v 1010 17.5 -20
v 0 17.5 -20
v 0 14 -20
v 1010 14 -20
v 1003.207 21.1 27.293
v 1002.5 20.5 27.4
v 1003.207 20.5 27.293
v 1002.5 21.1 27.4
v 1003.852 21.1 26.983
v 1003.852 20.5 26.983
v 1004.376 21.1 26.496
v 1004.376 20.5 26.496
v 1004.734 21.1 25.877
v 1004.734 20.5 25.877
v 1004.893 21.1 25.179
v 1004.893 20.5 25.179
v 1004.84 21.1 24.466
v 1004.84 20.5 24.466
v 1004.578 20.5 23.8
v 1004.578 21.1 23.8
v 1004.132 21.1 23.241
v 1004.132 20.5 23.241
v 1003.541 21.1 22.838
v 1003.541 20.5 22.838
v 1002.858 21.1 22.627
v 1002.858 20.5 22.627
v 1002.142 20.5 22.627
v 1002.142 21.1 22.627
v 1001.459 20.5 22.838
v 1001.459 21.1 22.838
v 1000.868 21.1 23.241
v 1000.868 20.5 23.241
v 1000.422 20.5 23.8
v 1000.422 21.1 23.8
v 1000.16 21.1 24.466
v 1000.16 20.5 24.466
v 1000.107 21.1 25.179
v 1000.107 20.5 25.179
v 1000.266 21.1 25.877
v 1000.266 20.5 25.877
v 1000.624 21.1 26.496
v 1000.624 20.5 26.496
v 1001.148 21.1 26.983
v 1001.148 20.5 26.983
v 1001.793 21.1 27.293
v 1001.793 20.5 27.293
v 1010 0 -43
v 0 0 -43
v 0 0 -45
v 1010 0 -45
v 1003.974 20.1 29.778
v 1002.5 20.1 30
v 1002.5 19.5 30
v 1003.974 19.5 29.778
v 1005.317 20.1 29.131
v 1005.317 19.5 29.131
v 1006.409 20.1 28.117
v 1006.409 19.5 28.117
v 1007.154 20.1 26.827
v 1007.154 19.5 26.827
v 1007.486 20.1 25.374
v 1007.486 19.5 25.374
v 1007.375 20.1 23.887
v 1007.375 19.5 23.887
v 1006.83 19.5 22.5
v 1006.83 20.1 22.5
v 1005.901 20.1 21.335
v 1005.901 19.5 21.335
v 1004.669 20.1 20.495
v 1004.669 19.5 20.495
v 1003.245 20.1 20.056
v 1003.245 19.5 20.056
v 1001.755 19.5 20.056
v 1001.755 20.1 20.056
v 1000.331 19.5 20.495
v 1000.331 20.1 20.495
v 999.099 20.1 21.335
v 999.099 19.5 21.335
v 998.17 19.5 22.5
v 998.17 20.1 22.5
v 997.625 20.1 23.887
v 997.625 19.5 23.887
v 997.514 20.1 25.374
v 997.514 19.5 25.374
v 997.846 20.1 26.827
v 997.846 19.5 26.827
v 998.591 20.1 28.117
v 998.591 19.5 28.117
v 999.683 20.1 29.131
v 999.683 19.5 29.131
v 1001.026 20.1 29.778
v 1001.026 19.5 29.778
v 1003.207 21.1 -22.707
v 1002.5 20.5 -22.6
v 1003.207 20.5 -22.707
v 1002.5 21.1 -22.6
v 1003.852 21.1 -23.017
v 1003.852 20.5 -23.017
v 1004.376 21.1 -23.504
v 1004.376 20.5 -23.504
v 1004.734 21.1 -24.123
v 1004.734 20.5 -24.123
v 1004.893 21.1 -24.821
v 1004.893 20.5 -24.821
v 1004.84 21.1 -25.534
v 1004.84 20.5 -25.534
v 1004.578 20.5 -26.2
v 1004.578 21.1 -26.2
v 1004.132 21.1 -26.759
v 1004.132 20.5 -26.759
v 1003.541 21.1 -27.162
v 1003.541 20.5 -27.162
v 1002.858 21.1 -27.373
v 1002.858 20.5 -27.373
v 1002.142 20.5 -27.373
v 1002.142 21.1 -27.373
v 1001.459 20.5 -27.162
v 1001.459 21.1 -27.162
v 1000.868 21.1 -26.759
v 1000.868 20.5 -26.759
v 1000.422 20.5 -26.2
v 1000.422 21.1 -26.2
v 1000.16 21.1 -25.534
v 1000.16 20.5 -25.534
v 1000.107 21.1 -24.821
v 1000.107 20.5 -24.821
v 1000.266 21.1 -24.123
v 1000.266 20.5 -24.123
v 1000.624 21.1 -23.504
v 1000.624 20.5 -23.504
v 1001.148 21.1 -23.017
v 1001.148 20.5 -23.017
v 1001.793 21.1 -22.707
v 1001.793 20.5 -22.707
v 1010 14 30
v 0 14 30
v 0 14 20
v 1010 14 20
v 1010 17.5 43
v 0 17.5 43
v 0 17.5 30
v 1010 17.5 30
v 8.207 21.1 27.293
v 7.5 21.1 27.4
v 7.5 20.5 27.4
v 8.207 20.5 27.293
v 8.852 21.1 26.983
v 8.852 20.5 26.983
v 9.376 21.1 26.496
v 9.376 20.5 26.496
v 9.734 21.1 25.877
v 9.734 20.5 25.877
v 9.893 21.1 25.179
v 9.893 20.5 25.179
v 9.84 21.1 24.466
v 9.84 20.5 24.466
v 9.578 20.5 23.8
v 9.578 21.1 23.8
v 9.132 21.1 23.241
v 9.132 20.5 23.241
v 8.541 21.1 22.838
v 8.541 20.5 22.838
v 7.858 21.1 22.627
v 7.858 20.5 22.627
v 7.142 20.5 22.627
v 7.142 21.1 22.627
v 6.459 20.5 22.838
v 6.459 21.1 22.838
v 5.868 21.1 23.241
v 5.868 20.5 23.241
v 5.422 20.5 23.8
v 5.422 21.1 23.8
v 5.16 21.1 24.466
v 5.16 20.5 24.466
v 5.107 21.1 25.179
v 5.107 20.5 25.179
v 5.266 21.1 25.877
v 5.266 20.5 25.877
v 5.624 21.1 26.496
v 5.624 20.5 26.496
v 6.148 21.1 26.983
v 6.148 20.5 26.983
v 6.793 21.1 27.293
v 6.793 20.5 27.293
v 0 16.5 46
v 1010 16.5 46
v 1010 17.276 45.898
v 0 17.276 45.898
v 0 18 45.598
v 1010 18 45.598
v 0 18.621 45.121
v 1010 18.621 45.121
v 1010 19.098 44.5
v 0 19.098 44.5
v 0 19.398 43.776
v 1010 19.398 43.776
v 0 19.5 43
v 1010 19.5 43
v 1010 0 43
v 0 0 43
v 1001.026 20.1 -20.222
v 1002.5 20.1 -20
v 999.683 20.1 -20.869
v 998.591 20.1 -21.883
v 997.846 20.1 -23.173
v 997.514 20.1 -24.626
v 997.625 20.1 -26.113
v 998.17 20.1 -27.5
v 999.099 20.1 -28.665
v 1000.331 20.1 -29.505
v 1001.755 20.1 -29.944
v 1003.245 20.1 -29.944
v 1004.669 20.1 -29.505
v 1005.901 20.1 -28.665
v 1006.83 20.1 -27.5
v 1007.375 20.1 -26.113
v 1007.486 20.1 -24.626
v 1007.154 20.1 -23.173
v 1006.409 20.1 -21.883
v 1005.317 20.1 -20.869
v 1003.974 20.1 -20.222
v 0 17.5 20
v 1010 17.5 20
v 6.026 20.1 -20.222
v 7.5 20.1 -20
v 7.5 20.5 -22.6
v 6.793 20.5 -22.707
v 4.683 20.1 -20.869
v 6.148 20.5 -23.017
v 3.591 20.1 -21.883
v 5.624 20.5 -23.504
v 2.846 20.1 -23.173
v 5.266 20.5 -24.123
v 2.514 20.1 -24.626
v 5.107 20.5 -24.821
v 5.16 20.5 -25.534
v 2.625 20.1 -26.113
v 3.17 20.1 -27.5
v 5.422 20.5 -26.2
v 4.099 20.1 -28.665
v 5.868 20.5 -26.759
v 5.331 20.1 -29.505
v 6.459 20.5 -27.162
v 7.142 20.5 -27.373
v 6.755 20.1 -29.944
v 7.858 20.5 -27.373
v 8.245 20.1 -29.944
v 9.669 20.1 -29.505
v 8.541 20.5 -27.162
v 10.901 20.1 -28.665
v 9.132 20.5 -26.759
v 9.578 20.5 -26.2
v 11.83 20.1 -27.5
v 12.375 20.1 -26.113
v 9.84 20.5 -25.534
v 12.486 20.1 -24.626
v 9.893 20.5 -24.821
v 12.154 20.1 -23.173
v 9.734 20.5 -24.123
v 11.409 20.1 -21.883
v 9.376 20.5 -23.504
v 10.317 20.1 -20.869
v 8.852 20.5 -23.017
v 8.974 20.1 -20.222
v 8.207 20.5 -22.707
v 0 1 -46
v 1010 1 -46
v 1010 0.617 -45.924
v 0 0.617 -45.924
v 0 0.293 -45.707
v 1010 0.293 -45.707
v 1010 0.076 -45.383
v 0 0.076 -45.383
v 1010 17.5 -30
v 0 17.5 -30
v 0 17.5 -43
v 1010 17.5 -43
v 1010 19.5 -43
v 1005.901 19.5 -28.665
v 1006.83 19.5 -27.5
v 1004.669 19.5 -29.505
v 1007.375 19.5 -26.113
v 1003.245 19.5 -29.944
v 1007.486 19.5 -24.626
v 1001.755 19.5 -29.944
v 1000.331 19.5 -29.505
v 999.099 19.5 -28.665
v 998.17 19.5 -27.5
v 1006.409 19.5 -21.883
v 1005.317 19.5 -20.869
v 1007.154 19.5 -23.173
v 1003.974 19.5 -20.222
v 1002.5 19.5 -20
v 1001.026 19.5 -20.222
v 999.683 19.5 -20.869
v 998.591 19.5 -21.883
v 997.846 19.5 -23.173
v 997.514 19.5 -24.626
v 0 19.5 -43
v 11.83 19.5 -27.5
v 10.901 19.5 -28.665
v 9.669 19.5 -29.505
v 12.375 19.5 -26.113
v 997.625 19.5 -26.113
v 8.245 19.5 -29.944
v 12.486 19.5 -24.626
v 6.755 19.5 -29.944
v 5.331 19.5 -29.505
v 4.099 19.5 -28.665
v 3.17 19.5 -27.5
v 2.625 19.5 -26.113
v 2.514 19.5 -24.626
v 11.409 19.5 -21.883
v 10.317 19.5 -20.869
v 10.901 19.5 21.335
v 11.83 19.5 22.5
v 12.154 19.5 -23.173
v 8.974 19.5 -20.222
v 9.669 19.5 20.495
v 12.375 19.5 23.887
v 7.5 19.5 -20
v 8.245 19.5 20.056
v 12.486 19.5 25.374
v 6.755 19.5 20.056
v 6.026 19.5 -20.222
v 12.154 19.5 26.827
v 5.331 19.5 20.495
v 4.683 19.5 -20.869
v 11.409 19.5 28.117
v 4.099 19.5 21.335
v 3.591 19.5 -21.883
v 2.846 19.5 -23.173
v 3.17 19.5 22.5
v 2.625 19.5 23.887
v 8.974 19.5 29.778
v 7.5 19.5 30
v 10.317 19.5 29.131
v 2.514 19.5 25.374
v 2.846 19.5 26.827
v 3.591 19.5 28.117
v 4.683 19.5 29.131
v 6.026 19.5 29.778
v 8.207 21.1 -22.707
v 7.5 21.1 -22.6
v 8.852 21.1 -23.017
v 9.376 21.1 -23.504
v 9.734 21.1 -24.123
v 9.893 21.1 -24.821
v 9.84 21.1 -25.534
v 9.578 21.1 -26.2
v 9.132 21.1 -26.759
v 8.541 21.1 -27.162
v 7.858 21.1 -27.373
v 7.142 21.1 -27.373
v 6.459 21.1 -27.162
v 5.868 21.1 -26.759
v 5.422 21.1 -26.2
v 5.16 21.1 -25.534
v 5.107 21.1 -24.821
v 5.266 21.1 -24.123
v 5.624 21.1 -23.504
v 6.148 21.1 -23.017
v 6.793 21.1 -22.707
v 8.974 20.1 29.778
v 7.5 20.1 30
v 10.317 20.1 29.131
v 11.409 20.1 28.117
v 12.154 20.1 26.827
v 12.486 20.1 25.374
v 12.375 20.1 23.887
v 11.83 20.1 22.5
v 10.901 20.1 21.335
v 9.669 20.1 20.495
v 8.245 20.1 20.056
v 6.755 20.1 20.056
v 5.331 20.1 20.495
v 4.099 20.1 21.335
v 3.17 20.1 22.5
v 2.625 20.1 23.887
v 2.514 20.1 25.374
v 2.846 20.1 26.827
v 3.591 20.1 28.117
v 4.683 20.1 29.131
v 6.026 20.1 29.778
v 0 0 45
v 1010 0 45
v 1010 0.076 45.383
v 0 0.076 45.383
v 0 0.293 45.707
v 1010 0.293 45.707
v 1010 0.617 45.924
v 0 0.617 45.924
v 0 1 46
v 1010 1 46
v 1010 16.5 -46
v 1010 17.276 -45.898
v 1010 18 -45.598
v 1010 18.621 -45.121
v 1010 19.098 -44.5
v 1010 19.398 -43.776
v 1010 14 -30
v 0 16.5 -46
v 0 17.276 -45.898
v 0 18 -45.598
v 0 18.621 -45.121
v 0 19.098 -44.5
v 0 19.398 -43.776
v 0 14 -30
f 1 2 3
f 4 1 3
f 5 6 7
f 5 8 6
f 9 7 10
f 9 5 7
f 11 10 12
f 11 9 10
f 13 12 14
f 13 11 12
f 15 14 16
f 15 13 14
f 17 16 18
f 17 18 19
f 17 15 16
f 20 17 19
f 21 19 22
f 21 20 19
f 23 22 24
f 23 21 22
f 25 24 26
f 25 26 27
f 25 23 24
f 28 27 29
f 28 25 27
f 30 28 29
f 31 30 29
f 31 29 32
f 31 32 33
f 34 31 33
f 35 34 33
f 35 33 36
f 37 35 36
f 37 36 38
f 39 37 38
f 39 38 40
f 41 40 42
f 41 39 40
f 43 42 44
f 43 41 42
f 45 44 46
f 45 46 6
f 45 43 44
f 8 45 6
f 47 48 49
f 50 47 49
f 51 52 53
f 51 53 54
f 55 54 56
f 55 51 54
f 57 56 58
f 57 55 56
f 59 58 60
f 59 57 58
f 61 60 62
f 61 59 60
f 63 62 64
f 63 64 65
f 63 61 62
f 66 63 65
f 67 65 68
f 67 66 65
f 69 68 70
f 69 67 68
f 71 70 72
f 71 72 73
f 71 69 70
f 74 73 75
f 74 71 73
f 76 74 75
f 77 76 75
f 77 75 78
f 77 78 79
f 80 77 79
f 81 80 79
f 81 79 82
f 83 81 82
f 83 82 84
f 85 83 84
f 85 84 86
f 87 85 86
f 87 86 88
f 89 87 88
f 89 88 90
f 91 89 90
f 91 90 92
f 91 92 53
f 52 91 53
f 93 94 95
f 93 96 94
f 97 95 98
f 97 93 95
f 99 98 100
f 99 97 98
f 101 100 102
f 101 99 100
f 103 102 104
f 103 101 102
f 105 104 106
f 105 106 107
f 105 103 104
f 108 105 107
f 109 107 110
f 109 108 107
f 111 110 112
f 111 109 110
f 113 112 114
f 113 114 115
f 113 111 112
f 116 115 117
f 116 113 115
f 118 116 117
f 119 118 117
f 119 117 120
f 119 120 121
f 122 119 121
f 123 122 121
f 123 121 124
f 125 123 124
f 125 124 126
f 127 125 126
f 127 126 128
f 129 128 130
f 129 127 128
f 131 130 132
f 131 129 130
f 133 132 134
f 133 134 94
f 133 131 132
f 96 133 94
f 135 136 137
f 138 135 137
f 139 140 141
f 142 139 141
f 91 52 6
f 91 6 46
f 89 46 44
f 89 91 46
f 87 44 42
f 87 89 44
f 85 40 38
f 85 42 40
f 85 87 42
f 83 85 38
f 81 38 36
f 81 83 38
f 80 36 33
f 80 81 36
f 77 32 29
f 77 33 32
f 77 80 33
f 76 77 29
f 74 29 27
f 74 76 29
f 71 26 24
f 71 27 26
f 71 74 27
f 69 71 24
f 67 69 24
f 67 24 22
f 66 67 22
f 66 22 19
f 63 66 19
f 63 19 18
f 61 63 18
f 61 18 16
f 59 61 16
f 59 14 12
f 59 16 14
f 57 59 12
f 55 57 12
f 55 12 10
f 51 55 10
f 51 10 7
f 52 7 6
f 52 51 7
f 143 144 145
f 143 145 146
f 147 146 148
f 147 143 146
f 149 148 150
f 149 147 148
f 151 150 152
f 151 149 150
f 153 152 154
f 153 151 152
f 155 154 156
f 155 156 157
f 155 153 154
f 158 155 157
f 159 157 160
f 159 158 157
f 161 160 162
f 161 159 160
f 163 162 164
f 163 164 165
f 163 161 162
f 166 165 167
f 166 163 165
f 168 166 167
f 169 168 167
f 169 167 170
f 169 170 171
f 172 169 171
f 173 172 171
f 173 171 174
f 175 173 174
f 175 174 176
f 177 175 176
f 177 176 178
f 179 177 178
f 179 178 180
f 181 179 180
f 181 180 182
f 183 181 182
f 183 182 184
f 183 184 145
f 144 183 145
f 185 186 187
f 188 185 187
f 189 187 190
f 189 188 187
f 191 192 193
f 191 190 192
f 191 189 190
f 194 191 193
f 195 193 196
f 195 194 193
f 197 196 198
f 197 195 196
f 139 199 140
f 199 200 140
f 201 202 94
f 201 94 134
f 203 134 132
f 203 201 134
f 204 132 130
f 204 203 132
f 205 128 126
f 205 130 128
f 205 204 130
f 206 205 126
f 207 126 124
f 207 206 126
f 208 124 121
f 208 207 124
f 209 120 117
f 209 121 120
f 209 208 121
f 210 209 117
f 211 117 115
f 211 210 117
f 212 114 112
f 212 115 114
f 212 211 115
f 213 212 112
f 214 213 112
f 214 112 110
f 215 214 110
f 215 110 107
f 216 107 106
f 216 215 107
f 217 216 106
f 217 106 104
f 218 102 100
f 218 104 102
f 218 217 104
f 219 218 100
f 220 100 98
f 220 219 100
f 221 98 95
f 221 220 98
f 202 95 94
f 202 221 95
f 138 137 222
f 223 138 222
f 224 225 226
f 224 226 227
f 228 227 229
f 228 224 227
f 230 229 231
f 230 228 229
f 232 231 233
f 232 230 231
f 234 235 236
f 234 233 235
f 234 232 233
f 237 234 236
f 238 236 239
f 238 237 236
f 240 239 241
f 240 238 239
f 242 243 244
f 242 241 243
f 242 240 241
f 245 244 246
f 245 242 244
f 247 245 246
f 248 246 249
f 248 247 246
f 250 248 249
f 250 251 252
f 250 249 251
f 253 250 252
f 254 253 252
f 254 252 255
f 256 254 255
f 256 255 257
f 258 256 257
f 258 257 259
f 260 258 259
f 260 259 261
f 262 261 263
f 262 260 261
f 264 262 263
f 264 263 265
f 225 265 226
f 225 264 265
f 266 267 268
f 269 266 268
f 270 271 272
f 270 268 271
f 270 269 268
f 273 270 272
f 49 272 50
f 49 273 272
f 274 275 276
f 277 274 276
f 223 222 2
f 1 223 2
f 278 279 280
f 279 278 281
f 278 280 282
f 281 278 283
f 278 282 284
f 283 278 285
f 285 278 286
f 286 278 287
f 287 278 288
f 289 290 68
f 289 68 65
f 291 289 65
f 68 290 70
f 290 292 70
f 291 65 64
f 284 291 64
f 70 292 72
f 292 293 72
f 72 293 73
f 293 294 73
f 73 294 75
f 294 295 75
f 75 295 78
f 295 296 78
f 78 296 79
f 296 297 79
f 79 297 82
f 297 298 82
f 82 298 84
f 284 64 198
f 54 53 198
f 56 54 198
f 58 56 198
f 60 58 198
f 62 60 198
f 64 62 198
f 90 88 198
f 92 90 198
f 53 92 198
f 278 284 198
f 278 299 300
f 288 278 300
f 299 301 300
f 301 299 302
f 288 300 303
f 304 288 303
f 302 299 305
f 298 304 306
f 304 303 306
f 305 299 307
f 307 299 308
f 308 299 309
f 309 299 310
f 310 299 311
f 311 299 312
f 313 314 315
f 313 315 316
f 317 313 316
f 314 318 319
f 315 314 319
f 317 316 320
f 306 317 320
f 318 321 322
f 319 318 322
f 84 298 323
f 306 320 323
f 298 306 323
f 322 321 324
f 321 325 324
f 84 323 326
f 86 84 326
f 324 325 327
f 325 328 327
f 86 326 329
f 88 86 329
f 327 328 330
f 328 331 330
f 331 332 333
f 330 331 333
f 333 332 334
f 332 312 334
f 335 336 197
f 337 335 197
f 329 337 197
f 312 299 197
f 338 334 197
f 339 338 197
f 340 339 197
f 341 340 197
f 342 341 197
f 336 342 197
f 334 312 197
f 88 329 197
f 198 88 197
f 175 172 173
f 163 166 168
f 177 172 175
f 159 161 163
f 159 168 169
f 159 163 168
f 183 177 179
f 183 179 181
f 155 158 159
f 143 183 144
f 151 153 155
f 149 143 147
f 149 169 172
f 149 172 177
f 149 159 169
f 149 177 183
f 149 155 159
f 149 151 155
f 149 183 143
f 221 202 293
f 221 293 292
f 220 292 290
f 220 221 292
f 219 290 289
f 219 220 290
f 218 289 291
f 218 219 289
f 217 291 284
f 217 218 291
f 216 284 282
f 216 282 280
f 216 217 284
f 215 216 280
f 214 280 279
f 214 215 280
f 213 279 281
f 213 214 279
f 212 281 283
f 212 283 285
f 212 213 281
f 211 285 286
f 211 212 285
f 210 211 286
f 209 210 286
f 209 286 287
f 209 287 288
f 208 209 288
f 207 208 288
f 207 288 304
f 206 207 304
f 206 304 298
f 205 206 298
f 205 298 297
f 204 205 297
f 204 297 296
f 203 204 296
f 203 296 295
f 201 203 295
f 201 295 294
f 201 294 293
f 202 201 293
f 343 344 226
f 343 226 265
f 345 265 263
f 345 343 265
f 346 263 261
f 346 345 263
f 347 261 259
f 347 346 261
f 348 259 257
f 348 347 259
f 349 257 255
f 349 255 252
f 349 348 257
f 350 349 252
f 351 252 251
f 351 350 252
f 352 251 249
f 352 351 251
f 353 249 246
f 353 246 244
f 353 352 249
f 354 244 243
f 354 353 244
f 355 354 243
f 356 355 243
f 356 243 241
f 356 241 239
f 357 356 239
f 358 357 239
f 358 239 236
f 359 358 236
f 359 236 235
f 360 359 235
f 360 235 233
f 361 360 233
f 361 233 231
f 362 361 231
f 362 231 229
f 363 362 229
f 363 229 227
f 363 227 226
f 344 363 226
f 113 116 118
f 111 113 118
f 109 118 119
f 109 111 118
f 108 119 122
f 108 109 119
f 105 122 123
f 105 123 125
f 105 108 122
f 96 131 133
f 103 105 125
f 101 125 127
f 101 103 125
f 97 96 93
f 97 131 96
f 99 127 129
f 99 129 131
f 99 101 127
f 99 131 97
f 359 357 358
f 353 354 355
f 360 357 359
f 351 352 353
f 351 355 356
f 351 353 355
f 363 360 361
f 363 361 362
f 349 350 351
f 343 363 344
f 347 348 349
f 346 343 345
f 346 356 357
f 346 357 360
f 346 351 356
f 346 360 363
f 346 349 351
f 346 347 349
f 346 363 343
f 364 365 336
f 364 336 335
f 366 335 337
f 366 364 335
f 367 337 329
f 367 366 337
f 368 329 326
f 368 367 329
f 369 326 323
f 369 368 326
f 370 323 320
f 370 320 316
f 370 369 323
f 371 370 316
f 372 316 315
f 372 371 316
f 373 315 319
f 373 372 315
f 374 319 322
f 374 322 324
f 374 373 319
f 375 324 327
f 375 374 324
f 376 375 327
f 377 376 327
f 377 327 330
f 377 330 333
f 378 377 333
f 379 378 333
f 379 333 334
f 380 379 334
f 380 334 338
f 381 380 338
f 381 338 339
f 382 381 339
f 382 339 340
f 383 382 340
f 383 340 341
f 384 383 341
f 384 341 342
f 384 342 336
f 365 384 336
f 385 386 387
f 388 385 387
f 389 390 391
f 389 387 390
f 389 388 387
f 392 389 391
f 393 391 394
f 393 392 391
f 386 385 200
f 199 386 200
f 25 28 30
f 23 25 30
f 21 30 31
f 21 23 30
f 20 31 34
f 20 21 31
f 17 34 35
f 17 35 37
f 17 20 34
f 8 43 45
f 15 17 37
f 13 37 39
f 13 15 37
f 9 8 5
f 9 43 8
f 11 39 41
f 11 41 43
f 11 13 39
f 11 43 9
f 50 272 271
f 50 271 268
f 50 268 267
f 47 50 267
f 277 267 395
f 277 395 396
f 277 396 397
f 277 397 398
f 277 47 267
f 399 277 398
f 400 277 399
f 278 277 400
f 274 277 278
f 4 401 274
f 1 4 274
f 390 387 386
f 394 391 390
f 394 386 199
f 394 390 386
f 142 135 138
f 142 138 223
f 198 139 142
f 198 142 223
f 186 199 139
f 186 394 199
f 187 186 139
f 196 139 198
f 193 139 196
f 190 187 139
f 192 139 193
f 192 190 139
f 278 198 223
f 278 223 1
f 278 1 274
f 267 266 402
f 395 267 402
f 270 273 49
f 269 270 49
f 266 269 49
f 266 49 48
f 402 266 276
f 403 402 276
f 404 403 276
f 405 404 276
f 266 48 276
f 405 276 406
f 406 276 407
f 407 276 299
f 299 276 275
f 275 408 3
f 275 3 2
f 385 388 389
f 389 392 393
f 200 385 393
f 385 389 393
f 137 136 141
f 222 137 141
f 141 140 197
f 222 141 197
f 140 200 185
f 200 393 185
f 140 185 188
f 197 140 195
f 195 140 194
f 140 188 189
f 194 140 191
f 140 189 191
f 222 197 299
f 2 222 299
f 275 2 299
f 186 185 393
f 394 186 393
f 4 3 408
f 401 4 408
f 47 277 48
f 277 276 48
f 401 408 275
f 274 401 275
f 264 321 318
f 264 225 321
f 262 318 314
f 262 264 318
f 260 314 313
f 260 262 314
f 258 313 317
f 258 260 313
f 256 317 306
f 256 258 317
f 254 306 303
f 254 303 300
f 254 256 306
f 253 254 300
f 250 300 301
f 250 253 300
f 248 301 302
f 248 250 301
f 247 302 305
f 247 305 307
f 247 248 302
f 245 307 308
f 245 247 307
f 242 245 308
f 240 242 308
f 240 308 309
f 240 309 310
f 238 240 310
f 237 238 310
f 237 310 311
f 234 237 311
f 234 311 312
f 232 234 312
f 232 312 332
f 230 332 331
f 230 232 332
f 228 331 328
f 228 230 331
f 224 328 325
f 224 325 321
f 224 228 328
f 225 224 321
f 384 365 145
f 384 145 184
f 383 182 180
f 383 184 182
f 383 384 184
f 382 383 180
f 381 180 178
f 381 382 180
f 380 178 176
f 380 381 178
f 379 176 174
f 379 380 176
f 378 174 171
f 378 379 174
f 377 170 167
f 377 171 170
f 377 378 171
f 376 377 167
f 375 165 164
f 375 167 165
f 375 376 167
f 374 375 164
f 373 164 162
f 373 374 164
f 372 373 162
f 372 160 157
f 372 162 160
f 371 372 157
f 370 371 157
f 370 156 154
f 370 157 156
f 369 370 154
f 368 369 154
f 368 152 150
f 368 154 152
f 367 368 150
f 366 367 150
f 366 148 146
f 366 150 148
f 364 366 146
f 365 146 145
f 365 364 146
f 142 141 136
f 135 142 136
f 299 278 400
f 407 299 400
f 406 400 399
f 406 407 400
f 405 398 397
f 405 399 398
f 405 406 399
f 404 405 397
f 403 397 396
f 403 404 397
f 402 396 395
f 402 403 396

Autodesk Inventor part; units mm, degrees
sketch "Sketch_1" plane through (0, 0, 0) normal (1, 0, 0) x (0, 1, 0)
  line L0 (16.5, 46) -> (1, 46)
  arc A0 (1, 46) -> (0, 45) centre (1, 45) ccw
  line L1 (0, 45) -> (0, 43)
  line L2 (0, 43) -> (17.5, 43)
  line L3 (17.5, 43) -> (17.5, 30)
  line L4 (17.5, 30) -> (14, 30)
  line L5 (14, 30) -> (14, 20)
  line L6 (14, 20) -> (17.5, 20)
  line L7 (17.5, 20) -> (17.5, -20)
  line L8 (17.5, -20) -> (14, -20)
  line L9 (14, -20) -> (14, -30)
  line L10 (14, -30) -> (17.5, -30)
  line L11 (17.5, -30) -> (17.5, -43)
  line L12 (17.5, -43) -> (0, -43)
  line L13 (0, -43) -> (0, -45)
  arc A1 (0, -45) -> (1, -46) centre (1, -45) ccw
  line L14 (1, -46) -> (16.5, -46)
  arc A2 (16.5, -46) -> (19.5, -43) centre (16.5, -43) ccw
  line L15 (19.5, -43) -> (19.5, 43)
  arc A3 (19.5, 43) -> (16.5, 46) centre (16.5, 43) ccw
extrude "Extrusion1" add sketch "Sketch_1" along normal blind 1010
sketch "Sketch_3" plane through (7.5, 0, 0) normal (1, 0, 0) x (0, 0, -1)
  line L0 (-25, 21.1) -> (-25, 19.5)
  line L1 (-25, 19.5) -> (-30, 19.5)
  line L2 (-30, 19.5) -> (-30, 20.1)
  line L3 (-30, 20.1) -> (-27.4, 20.5)
  line L4 (-27.4, 20.5) -> (-27.4, 21.1)
  line L5 (-27.4, 21.1) -> (-25, 21.1)
  line L6 (-25, 21.1) -> (-25, 19.5)
revolve "Revolution1" add sketch "Sketch_3" angle 360 about axis through (7.5, 21.1, 25) along (0, 1, 0)
pattern_linear "Rectangular Pattern1" count 2 spacing 995 along (1, 0, 0) count 2 spacing 50 along (0, 0, -1) of "Revolution1"
ref_plane "pc_body_XY" through (7.5, 14, 0) normal (1, 0, 0) x (0, 0, -1)
ref_plane "pc_body_YZ" through (7.5, 14, 0) normal (0, 0, -1) x (0, 1, 0)
ref_plane "pc_body_ZX" through (7.5, 14, 0) normal (0, 1, 0) x (1, 0, 0)
properties part number "KR55-980-Protected Cover"
